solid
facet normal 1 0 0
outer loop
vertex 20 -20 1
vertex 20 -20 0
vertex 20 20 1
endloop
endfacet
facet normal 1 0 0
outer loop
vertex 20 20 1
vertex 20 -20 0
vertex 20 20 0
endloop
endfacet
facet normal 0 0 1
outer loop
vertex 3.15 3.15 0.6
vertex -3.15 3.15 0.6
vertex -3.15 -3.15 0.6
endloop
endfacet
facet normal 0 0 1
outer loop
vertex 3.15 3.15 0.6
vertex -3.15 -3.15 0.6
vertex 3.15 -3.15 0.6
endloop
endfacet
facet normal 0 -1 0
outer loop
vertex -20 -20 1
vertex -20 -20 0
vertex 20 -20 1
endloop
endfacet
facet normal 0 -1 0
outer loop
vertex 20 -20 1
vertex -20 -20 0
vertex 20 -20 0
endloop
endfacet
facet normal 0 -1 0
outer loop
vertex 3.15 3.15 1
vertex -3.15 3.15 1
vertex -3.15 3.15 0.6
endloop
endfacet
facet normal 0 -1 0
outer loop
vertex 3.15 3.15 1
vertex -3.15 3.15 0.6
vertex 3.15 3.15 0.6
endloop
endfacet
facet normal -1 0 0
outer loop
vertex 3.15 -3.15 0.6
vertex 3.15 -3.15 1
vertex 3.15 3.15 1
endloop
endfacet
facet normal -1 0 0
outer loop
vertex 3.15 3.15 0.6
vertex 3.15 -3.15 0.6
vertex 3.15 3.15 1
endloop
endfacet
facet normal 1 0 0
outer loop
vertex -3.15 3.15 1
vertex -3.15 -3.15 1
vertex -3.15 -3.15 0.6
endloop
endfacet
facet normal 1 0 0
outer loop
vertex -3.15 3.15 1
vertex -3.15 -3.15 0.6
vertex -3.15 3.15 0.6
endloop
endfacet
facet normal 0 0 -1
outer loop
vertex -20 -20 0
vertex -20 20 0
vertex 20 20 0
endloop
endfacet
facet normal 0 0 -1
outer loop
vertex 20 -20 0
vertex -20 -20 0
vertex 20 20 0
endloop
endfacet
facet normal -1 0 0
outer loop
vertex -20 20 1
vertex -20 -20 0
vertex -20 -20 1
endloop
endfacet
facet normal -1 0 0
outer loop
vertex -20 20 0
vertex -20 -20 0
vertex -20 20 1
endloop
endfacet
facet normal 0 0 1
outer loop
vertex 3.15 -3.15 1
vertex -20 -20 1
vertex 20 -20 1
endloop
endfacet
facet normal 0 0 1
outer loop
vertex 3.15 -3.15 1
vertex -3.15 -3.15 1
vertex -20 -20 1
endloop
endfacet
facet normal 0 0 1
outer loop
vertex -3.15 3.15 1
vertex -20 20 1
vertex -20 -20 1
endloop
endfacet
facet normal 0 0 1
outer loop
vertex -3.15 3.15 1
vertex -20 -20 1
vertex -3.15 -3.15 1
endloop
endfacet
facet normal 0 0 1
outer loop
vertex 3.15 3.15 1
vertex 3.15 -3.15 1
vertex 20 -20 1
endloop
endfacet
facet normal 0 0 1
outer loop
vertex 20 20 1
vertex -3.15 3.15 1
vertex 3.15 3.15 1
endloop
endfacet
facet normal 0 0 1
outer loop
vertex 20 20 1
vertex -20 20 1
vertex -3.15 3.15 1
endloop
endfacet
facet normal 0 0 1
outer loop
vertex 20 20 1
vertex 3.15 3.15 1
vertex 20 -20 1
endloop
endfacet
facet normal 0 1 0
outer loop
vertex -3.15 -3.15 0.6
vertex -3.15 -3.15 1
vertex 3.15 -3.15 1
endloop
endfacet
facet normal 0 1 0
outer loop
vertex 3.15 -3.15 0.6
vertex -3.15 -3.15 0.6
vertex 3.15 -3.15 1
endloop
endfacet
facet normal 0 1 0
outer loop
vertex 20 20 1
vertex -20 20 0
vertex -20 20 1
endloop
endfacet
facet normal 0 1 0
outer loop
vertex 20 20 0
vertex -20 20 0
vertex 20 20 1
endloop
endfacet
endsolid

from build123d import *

# Parameters (mm, degrees)
SKETCH1_W           = 40
SKETCH1_H           = 40
SKETCH1_W_2         = 6.3
SKETCH1_H_2         = 6.3
BOSS_EXTRUDE1_DEPTH = 1
PCB_START           = 1
SKETCH1_3_W         = 6.3
SKETCH1_3_H         = 6.3
PCB_DEPTH           = 0.4


with BuildPart() as part:
    # Sketch1 → Boss-Extrude1 (new body)
    # profile 1 of 2: a face of its own
    with BuildSketch(Plane.XY):
        Rectangle(SKETCH1_W, SKETCH1_H)
        Rectangle(SKETCH1_W_2, SKETCH1_H_2, mode=Mode.SUBTRACT)
    # profile 2 of 2: a face of its own
    with BuildSketch(Plane.XY):
        Rectangle(SKETCH1_W_2, SKETCH1_H_2)
    extrude(amount=BOSS_EXTRUDE1_DEPTH)

    # Sketch1<3> → PCB (cut)
    with BuildSketch(Plane.XY.offset(PCB_START)):
        Rectangle(SKETCH1_3_W, SKETCH1_3_H)
    extrude(amount=-PCB_DEPTH, mode=Mode.SUBTRACT)


solid = part.part
